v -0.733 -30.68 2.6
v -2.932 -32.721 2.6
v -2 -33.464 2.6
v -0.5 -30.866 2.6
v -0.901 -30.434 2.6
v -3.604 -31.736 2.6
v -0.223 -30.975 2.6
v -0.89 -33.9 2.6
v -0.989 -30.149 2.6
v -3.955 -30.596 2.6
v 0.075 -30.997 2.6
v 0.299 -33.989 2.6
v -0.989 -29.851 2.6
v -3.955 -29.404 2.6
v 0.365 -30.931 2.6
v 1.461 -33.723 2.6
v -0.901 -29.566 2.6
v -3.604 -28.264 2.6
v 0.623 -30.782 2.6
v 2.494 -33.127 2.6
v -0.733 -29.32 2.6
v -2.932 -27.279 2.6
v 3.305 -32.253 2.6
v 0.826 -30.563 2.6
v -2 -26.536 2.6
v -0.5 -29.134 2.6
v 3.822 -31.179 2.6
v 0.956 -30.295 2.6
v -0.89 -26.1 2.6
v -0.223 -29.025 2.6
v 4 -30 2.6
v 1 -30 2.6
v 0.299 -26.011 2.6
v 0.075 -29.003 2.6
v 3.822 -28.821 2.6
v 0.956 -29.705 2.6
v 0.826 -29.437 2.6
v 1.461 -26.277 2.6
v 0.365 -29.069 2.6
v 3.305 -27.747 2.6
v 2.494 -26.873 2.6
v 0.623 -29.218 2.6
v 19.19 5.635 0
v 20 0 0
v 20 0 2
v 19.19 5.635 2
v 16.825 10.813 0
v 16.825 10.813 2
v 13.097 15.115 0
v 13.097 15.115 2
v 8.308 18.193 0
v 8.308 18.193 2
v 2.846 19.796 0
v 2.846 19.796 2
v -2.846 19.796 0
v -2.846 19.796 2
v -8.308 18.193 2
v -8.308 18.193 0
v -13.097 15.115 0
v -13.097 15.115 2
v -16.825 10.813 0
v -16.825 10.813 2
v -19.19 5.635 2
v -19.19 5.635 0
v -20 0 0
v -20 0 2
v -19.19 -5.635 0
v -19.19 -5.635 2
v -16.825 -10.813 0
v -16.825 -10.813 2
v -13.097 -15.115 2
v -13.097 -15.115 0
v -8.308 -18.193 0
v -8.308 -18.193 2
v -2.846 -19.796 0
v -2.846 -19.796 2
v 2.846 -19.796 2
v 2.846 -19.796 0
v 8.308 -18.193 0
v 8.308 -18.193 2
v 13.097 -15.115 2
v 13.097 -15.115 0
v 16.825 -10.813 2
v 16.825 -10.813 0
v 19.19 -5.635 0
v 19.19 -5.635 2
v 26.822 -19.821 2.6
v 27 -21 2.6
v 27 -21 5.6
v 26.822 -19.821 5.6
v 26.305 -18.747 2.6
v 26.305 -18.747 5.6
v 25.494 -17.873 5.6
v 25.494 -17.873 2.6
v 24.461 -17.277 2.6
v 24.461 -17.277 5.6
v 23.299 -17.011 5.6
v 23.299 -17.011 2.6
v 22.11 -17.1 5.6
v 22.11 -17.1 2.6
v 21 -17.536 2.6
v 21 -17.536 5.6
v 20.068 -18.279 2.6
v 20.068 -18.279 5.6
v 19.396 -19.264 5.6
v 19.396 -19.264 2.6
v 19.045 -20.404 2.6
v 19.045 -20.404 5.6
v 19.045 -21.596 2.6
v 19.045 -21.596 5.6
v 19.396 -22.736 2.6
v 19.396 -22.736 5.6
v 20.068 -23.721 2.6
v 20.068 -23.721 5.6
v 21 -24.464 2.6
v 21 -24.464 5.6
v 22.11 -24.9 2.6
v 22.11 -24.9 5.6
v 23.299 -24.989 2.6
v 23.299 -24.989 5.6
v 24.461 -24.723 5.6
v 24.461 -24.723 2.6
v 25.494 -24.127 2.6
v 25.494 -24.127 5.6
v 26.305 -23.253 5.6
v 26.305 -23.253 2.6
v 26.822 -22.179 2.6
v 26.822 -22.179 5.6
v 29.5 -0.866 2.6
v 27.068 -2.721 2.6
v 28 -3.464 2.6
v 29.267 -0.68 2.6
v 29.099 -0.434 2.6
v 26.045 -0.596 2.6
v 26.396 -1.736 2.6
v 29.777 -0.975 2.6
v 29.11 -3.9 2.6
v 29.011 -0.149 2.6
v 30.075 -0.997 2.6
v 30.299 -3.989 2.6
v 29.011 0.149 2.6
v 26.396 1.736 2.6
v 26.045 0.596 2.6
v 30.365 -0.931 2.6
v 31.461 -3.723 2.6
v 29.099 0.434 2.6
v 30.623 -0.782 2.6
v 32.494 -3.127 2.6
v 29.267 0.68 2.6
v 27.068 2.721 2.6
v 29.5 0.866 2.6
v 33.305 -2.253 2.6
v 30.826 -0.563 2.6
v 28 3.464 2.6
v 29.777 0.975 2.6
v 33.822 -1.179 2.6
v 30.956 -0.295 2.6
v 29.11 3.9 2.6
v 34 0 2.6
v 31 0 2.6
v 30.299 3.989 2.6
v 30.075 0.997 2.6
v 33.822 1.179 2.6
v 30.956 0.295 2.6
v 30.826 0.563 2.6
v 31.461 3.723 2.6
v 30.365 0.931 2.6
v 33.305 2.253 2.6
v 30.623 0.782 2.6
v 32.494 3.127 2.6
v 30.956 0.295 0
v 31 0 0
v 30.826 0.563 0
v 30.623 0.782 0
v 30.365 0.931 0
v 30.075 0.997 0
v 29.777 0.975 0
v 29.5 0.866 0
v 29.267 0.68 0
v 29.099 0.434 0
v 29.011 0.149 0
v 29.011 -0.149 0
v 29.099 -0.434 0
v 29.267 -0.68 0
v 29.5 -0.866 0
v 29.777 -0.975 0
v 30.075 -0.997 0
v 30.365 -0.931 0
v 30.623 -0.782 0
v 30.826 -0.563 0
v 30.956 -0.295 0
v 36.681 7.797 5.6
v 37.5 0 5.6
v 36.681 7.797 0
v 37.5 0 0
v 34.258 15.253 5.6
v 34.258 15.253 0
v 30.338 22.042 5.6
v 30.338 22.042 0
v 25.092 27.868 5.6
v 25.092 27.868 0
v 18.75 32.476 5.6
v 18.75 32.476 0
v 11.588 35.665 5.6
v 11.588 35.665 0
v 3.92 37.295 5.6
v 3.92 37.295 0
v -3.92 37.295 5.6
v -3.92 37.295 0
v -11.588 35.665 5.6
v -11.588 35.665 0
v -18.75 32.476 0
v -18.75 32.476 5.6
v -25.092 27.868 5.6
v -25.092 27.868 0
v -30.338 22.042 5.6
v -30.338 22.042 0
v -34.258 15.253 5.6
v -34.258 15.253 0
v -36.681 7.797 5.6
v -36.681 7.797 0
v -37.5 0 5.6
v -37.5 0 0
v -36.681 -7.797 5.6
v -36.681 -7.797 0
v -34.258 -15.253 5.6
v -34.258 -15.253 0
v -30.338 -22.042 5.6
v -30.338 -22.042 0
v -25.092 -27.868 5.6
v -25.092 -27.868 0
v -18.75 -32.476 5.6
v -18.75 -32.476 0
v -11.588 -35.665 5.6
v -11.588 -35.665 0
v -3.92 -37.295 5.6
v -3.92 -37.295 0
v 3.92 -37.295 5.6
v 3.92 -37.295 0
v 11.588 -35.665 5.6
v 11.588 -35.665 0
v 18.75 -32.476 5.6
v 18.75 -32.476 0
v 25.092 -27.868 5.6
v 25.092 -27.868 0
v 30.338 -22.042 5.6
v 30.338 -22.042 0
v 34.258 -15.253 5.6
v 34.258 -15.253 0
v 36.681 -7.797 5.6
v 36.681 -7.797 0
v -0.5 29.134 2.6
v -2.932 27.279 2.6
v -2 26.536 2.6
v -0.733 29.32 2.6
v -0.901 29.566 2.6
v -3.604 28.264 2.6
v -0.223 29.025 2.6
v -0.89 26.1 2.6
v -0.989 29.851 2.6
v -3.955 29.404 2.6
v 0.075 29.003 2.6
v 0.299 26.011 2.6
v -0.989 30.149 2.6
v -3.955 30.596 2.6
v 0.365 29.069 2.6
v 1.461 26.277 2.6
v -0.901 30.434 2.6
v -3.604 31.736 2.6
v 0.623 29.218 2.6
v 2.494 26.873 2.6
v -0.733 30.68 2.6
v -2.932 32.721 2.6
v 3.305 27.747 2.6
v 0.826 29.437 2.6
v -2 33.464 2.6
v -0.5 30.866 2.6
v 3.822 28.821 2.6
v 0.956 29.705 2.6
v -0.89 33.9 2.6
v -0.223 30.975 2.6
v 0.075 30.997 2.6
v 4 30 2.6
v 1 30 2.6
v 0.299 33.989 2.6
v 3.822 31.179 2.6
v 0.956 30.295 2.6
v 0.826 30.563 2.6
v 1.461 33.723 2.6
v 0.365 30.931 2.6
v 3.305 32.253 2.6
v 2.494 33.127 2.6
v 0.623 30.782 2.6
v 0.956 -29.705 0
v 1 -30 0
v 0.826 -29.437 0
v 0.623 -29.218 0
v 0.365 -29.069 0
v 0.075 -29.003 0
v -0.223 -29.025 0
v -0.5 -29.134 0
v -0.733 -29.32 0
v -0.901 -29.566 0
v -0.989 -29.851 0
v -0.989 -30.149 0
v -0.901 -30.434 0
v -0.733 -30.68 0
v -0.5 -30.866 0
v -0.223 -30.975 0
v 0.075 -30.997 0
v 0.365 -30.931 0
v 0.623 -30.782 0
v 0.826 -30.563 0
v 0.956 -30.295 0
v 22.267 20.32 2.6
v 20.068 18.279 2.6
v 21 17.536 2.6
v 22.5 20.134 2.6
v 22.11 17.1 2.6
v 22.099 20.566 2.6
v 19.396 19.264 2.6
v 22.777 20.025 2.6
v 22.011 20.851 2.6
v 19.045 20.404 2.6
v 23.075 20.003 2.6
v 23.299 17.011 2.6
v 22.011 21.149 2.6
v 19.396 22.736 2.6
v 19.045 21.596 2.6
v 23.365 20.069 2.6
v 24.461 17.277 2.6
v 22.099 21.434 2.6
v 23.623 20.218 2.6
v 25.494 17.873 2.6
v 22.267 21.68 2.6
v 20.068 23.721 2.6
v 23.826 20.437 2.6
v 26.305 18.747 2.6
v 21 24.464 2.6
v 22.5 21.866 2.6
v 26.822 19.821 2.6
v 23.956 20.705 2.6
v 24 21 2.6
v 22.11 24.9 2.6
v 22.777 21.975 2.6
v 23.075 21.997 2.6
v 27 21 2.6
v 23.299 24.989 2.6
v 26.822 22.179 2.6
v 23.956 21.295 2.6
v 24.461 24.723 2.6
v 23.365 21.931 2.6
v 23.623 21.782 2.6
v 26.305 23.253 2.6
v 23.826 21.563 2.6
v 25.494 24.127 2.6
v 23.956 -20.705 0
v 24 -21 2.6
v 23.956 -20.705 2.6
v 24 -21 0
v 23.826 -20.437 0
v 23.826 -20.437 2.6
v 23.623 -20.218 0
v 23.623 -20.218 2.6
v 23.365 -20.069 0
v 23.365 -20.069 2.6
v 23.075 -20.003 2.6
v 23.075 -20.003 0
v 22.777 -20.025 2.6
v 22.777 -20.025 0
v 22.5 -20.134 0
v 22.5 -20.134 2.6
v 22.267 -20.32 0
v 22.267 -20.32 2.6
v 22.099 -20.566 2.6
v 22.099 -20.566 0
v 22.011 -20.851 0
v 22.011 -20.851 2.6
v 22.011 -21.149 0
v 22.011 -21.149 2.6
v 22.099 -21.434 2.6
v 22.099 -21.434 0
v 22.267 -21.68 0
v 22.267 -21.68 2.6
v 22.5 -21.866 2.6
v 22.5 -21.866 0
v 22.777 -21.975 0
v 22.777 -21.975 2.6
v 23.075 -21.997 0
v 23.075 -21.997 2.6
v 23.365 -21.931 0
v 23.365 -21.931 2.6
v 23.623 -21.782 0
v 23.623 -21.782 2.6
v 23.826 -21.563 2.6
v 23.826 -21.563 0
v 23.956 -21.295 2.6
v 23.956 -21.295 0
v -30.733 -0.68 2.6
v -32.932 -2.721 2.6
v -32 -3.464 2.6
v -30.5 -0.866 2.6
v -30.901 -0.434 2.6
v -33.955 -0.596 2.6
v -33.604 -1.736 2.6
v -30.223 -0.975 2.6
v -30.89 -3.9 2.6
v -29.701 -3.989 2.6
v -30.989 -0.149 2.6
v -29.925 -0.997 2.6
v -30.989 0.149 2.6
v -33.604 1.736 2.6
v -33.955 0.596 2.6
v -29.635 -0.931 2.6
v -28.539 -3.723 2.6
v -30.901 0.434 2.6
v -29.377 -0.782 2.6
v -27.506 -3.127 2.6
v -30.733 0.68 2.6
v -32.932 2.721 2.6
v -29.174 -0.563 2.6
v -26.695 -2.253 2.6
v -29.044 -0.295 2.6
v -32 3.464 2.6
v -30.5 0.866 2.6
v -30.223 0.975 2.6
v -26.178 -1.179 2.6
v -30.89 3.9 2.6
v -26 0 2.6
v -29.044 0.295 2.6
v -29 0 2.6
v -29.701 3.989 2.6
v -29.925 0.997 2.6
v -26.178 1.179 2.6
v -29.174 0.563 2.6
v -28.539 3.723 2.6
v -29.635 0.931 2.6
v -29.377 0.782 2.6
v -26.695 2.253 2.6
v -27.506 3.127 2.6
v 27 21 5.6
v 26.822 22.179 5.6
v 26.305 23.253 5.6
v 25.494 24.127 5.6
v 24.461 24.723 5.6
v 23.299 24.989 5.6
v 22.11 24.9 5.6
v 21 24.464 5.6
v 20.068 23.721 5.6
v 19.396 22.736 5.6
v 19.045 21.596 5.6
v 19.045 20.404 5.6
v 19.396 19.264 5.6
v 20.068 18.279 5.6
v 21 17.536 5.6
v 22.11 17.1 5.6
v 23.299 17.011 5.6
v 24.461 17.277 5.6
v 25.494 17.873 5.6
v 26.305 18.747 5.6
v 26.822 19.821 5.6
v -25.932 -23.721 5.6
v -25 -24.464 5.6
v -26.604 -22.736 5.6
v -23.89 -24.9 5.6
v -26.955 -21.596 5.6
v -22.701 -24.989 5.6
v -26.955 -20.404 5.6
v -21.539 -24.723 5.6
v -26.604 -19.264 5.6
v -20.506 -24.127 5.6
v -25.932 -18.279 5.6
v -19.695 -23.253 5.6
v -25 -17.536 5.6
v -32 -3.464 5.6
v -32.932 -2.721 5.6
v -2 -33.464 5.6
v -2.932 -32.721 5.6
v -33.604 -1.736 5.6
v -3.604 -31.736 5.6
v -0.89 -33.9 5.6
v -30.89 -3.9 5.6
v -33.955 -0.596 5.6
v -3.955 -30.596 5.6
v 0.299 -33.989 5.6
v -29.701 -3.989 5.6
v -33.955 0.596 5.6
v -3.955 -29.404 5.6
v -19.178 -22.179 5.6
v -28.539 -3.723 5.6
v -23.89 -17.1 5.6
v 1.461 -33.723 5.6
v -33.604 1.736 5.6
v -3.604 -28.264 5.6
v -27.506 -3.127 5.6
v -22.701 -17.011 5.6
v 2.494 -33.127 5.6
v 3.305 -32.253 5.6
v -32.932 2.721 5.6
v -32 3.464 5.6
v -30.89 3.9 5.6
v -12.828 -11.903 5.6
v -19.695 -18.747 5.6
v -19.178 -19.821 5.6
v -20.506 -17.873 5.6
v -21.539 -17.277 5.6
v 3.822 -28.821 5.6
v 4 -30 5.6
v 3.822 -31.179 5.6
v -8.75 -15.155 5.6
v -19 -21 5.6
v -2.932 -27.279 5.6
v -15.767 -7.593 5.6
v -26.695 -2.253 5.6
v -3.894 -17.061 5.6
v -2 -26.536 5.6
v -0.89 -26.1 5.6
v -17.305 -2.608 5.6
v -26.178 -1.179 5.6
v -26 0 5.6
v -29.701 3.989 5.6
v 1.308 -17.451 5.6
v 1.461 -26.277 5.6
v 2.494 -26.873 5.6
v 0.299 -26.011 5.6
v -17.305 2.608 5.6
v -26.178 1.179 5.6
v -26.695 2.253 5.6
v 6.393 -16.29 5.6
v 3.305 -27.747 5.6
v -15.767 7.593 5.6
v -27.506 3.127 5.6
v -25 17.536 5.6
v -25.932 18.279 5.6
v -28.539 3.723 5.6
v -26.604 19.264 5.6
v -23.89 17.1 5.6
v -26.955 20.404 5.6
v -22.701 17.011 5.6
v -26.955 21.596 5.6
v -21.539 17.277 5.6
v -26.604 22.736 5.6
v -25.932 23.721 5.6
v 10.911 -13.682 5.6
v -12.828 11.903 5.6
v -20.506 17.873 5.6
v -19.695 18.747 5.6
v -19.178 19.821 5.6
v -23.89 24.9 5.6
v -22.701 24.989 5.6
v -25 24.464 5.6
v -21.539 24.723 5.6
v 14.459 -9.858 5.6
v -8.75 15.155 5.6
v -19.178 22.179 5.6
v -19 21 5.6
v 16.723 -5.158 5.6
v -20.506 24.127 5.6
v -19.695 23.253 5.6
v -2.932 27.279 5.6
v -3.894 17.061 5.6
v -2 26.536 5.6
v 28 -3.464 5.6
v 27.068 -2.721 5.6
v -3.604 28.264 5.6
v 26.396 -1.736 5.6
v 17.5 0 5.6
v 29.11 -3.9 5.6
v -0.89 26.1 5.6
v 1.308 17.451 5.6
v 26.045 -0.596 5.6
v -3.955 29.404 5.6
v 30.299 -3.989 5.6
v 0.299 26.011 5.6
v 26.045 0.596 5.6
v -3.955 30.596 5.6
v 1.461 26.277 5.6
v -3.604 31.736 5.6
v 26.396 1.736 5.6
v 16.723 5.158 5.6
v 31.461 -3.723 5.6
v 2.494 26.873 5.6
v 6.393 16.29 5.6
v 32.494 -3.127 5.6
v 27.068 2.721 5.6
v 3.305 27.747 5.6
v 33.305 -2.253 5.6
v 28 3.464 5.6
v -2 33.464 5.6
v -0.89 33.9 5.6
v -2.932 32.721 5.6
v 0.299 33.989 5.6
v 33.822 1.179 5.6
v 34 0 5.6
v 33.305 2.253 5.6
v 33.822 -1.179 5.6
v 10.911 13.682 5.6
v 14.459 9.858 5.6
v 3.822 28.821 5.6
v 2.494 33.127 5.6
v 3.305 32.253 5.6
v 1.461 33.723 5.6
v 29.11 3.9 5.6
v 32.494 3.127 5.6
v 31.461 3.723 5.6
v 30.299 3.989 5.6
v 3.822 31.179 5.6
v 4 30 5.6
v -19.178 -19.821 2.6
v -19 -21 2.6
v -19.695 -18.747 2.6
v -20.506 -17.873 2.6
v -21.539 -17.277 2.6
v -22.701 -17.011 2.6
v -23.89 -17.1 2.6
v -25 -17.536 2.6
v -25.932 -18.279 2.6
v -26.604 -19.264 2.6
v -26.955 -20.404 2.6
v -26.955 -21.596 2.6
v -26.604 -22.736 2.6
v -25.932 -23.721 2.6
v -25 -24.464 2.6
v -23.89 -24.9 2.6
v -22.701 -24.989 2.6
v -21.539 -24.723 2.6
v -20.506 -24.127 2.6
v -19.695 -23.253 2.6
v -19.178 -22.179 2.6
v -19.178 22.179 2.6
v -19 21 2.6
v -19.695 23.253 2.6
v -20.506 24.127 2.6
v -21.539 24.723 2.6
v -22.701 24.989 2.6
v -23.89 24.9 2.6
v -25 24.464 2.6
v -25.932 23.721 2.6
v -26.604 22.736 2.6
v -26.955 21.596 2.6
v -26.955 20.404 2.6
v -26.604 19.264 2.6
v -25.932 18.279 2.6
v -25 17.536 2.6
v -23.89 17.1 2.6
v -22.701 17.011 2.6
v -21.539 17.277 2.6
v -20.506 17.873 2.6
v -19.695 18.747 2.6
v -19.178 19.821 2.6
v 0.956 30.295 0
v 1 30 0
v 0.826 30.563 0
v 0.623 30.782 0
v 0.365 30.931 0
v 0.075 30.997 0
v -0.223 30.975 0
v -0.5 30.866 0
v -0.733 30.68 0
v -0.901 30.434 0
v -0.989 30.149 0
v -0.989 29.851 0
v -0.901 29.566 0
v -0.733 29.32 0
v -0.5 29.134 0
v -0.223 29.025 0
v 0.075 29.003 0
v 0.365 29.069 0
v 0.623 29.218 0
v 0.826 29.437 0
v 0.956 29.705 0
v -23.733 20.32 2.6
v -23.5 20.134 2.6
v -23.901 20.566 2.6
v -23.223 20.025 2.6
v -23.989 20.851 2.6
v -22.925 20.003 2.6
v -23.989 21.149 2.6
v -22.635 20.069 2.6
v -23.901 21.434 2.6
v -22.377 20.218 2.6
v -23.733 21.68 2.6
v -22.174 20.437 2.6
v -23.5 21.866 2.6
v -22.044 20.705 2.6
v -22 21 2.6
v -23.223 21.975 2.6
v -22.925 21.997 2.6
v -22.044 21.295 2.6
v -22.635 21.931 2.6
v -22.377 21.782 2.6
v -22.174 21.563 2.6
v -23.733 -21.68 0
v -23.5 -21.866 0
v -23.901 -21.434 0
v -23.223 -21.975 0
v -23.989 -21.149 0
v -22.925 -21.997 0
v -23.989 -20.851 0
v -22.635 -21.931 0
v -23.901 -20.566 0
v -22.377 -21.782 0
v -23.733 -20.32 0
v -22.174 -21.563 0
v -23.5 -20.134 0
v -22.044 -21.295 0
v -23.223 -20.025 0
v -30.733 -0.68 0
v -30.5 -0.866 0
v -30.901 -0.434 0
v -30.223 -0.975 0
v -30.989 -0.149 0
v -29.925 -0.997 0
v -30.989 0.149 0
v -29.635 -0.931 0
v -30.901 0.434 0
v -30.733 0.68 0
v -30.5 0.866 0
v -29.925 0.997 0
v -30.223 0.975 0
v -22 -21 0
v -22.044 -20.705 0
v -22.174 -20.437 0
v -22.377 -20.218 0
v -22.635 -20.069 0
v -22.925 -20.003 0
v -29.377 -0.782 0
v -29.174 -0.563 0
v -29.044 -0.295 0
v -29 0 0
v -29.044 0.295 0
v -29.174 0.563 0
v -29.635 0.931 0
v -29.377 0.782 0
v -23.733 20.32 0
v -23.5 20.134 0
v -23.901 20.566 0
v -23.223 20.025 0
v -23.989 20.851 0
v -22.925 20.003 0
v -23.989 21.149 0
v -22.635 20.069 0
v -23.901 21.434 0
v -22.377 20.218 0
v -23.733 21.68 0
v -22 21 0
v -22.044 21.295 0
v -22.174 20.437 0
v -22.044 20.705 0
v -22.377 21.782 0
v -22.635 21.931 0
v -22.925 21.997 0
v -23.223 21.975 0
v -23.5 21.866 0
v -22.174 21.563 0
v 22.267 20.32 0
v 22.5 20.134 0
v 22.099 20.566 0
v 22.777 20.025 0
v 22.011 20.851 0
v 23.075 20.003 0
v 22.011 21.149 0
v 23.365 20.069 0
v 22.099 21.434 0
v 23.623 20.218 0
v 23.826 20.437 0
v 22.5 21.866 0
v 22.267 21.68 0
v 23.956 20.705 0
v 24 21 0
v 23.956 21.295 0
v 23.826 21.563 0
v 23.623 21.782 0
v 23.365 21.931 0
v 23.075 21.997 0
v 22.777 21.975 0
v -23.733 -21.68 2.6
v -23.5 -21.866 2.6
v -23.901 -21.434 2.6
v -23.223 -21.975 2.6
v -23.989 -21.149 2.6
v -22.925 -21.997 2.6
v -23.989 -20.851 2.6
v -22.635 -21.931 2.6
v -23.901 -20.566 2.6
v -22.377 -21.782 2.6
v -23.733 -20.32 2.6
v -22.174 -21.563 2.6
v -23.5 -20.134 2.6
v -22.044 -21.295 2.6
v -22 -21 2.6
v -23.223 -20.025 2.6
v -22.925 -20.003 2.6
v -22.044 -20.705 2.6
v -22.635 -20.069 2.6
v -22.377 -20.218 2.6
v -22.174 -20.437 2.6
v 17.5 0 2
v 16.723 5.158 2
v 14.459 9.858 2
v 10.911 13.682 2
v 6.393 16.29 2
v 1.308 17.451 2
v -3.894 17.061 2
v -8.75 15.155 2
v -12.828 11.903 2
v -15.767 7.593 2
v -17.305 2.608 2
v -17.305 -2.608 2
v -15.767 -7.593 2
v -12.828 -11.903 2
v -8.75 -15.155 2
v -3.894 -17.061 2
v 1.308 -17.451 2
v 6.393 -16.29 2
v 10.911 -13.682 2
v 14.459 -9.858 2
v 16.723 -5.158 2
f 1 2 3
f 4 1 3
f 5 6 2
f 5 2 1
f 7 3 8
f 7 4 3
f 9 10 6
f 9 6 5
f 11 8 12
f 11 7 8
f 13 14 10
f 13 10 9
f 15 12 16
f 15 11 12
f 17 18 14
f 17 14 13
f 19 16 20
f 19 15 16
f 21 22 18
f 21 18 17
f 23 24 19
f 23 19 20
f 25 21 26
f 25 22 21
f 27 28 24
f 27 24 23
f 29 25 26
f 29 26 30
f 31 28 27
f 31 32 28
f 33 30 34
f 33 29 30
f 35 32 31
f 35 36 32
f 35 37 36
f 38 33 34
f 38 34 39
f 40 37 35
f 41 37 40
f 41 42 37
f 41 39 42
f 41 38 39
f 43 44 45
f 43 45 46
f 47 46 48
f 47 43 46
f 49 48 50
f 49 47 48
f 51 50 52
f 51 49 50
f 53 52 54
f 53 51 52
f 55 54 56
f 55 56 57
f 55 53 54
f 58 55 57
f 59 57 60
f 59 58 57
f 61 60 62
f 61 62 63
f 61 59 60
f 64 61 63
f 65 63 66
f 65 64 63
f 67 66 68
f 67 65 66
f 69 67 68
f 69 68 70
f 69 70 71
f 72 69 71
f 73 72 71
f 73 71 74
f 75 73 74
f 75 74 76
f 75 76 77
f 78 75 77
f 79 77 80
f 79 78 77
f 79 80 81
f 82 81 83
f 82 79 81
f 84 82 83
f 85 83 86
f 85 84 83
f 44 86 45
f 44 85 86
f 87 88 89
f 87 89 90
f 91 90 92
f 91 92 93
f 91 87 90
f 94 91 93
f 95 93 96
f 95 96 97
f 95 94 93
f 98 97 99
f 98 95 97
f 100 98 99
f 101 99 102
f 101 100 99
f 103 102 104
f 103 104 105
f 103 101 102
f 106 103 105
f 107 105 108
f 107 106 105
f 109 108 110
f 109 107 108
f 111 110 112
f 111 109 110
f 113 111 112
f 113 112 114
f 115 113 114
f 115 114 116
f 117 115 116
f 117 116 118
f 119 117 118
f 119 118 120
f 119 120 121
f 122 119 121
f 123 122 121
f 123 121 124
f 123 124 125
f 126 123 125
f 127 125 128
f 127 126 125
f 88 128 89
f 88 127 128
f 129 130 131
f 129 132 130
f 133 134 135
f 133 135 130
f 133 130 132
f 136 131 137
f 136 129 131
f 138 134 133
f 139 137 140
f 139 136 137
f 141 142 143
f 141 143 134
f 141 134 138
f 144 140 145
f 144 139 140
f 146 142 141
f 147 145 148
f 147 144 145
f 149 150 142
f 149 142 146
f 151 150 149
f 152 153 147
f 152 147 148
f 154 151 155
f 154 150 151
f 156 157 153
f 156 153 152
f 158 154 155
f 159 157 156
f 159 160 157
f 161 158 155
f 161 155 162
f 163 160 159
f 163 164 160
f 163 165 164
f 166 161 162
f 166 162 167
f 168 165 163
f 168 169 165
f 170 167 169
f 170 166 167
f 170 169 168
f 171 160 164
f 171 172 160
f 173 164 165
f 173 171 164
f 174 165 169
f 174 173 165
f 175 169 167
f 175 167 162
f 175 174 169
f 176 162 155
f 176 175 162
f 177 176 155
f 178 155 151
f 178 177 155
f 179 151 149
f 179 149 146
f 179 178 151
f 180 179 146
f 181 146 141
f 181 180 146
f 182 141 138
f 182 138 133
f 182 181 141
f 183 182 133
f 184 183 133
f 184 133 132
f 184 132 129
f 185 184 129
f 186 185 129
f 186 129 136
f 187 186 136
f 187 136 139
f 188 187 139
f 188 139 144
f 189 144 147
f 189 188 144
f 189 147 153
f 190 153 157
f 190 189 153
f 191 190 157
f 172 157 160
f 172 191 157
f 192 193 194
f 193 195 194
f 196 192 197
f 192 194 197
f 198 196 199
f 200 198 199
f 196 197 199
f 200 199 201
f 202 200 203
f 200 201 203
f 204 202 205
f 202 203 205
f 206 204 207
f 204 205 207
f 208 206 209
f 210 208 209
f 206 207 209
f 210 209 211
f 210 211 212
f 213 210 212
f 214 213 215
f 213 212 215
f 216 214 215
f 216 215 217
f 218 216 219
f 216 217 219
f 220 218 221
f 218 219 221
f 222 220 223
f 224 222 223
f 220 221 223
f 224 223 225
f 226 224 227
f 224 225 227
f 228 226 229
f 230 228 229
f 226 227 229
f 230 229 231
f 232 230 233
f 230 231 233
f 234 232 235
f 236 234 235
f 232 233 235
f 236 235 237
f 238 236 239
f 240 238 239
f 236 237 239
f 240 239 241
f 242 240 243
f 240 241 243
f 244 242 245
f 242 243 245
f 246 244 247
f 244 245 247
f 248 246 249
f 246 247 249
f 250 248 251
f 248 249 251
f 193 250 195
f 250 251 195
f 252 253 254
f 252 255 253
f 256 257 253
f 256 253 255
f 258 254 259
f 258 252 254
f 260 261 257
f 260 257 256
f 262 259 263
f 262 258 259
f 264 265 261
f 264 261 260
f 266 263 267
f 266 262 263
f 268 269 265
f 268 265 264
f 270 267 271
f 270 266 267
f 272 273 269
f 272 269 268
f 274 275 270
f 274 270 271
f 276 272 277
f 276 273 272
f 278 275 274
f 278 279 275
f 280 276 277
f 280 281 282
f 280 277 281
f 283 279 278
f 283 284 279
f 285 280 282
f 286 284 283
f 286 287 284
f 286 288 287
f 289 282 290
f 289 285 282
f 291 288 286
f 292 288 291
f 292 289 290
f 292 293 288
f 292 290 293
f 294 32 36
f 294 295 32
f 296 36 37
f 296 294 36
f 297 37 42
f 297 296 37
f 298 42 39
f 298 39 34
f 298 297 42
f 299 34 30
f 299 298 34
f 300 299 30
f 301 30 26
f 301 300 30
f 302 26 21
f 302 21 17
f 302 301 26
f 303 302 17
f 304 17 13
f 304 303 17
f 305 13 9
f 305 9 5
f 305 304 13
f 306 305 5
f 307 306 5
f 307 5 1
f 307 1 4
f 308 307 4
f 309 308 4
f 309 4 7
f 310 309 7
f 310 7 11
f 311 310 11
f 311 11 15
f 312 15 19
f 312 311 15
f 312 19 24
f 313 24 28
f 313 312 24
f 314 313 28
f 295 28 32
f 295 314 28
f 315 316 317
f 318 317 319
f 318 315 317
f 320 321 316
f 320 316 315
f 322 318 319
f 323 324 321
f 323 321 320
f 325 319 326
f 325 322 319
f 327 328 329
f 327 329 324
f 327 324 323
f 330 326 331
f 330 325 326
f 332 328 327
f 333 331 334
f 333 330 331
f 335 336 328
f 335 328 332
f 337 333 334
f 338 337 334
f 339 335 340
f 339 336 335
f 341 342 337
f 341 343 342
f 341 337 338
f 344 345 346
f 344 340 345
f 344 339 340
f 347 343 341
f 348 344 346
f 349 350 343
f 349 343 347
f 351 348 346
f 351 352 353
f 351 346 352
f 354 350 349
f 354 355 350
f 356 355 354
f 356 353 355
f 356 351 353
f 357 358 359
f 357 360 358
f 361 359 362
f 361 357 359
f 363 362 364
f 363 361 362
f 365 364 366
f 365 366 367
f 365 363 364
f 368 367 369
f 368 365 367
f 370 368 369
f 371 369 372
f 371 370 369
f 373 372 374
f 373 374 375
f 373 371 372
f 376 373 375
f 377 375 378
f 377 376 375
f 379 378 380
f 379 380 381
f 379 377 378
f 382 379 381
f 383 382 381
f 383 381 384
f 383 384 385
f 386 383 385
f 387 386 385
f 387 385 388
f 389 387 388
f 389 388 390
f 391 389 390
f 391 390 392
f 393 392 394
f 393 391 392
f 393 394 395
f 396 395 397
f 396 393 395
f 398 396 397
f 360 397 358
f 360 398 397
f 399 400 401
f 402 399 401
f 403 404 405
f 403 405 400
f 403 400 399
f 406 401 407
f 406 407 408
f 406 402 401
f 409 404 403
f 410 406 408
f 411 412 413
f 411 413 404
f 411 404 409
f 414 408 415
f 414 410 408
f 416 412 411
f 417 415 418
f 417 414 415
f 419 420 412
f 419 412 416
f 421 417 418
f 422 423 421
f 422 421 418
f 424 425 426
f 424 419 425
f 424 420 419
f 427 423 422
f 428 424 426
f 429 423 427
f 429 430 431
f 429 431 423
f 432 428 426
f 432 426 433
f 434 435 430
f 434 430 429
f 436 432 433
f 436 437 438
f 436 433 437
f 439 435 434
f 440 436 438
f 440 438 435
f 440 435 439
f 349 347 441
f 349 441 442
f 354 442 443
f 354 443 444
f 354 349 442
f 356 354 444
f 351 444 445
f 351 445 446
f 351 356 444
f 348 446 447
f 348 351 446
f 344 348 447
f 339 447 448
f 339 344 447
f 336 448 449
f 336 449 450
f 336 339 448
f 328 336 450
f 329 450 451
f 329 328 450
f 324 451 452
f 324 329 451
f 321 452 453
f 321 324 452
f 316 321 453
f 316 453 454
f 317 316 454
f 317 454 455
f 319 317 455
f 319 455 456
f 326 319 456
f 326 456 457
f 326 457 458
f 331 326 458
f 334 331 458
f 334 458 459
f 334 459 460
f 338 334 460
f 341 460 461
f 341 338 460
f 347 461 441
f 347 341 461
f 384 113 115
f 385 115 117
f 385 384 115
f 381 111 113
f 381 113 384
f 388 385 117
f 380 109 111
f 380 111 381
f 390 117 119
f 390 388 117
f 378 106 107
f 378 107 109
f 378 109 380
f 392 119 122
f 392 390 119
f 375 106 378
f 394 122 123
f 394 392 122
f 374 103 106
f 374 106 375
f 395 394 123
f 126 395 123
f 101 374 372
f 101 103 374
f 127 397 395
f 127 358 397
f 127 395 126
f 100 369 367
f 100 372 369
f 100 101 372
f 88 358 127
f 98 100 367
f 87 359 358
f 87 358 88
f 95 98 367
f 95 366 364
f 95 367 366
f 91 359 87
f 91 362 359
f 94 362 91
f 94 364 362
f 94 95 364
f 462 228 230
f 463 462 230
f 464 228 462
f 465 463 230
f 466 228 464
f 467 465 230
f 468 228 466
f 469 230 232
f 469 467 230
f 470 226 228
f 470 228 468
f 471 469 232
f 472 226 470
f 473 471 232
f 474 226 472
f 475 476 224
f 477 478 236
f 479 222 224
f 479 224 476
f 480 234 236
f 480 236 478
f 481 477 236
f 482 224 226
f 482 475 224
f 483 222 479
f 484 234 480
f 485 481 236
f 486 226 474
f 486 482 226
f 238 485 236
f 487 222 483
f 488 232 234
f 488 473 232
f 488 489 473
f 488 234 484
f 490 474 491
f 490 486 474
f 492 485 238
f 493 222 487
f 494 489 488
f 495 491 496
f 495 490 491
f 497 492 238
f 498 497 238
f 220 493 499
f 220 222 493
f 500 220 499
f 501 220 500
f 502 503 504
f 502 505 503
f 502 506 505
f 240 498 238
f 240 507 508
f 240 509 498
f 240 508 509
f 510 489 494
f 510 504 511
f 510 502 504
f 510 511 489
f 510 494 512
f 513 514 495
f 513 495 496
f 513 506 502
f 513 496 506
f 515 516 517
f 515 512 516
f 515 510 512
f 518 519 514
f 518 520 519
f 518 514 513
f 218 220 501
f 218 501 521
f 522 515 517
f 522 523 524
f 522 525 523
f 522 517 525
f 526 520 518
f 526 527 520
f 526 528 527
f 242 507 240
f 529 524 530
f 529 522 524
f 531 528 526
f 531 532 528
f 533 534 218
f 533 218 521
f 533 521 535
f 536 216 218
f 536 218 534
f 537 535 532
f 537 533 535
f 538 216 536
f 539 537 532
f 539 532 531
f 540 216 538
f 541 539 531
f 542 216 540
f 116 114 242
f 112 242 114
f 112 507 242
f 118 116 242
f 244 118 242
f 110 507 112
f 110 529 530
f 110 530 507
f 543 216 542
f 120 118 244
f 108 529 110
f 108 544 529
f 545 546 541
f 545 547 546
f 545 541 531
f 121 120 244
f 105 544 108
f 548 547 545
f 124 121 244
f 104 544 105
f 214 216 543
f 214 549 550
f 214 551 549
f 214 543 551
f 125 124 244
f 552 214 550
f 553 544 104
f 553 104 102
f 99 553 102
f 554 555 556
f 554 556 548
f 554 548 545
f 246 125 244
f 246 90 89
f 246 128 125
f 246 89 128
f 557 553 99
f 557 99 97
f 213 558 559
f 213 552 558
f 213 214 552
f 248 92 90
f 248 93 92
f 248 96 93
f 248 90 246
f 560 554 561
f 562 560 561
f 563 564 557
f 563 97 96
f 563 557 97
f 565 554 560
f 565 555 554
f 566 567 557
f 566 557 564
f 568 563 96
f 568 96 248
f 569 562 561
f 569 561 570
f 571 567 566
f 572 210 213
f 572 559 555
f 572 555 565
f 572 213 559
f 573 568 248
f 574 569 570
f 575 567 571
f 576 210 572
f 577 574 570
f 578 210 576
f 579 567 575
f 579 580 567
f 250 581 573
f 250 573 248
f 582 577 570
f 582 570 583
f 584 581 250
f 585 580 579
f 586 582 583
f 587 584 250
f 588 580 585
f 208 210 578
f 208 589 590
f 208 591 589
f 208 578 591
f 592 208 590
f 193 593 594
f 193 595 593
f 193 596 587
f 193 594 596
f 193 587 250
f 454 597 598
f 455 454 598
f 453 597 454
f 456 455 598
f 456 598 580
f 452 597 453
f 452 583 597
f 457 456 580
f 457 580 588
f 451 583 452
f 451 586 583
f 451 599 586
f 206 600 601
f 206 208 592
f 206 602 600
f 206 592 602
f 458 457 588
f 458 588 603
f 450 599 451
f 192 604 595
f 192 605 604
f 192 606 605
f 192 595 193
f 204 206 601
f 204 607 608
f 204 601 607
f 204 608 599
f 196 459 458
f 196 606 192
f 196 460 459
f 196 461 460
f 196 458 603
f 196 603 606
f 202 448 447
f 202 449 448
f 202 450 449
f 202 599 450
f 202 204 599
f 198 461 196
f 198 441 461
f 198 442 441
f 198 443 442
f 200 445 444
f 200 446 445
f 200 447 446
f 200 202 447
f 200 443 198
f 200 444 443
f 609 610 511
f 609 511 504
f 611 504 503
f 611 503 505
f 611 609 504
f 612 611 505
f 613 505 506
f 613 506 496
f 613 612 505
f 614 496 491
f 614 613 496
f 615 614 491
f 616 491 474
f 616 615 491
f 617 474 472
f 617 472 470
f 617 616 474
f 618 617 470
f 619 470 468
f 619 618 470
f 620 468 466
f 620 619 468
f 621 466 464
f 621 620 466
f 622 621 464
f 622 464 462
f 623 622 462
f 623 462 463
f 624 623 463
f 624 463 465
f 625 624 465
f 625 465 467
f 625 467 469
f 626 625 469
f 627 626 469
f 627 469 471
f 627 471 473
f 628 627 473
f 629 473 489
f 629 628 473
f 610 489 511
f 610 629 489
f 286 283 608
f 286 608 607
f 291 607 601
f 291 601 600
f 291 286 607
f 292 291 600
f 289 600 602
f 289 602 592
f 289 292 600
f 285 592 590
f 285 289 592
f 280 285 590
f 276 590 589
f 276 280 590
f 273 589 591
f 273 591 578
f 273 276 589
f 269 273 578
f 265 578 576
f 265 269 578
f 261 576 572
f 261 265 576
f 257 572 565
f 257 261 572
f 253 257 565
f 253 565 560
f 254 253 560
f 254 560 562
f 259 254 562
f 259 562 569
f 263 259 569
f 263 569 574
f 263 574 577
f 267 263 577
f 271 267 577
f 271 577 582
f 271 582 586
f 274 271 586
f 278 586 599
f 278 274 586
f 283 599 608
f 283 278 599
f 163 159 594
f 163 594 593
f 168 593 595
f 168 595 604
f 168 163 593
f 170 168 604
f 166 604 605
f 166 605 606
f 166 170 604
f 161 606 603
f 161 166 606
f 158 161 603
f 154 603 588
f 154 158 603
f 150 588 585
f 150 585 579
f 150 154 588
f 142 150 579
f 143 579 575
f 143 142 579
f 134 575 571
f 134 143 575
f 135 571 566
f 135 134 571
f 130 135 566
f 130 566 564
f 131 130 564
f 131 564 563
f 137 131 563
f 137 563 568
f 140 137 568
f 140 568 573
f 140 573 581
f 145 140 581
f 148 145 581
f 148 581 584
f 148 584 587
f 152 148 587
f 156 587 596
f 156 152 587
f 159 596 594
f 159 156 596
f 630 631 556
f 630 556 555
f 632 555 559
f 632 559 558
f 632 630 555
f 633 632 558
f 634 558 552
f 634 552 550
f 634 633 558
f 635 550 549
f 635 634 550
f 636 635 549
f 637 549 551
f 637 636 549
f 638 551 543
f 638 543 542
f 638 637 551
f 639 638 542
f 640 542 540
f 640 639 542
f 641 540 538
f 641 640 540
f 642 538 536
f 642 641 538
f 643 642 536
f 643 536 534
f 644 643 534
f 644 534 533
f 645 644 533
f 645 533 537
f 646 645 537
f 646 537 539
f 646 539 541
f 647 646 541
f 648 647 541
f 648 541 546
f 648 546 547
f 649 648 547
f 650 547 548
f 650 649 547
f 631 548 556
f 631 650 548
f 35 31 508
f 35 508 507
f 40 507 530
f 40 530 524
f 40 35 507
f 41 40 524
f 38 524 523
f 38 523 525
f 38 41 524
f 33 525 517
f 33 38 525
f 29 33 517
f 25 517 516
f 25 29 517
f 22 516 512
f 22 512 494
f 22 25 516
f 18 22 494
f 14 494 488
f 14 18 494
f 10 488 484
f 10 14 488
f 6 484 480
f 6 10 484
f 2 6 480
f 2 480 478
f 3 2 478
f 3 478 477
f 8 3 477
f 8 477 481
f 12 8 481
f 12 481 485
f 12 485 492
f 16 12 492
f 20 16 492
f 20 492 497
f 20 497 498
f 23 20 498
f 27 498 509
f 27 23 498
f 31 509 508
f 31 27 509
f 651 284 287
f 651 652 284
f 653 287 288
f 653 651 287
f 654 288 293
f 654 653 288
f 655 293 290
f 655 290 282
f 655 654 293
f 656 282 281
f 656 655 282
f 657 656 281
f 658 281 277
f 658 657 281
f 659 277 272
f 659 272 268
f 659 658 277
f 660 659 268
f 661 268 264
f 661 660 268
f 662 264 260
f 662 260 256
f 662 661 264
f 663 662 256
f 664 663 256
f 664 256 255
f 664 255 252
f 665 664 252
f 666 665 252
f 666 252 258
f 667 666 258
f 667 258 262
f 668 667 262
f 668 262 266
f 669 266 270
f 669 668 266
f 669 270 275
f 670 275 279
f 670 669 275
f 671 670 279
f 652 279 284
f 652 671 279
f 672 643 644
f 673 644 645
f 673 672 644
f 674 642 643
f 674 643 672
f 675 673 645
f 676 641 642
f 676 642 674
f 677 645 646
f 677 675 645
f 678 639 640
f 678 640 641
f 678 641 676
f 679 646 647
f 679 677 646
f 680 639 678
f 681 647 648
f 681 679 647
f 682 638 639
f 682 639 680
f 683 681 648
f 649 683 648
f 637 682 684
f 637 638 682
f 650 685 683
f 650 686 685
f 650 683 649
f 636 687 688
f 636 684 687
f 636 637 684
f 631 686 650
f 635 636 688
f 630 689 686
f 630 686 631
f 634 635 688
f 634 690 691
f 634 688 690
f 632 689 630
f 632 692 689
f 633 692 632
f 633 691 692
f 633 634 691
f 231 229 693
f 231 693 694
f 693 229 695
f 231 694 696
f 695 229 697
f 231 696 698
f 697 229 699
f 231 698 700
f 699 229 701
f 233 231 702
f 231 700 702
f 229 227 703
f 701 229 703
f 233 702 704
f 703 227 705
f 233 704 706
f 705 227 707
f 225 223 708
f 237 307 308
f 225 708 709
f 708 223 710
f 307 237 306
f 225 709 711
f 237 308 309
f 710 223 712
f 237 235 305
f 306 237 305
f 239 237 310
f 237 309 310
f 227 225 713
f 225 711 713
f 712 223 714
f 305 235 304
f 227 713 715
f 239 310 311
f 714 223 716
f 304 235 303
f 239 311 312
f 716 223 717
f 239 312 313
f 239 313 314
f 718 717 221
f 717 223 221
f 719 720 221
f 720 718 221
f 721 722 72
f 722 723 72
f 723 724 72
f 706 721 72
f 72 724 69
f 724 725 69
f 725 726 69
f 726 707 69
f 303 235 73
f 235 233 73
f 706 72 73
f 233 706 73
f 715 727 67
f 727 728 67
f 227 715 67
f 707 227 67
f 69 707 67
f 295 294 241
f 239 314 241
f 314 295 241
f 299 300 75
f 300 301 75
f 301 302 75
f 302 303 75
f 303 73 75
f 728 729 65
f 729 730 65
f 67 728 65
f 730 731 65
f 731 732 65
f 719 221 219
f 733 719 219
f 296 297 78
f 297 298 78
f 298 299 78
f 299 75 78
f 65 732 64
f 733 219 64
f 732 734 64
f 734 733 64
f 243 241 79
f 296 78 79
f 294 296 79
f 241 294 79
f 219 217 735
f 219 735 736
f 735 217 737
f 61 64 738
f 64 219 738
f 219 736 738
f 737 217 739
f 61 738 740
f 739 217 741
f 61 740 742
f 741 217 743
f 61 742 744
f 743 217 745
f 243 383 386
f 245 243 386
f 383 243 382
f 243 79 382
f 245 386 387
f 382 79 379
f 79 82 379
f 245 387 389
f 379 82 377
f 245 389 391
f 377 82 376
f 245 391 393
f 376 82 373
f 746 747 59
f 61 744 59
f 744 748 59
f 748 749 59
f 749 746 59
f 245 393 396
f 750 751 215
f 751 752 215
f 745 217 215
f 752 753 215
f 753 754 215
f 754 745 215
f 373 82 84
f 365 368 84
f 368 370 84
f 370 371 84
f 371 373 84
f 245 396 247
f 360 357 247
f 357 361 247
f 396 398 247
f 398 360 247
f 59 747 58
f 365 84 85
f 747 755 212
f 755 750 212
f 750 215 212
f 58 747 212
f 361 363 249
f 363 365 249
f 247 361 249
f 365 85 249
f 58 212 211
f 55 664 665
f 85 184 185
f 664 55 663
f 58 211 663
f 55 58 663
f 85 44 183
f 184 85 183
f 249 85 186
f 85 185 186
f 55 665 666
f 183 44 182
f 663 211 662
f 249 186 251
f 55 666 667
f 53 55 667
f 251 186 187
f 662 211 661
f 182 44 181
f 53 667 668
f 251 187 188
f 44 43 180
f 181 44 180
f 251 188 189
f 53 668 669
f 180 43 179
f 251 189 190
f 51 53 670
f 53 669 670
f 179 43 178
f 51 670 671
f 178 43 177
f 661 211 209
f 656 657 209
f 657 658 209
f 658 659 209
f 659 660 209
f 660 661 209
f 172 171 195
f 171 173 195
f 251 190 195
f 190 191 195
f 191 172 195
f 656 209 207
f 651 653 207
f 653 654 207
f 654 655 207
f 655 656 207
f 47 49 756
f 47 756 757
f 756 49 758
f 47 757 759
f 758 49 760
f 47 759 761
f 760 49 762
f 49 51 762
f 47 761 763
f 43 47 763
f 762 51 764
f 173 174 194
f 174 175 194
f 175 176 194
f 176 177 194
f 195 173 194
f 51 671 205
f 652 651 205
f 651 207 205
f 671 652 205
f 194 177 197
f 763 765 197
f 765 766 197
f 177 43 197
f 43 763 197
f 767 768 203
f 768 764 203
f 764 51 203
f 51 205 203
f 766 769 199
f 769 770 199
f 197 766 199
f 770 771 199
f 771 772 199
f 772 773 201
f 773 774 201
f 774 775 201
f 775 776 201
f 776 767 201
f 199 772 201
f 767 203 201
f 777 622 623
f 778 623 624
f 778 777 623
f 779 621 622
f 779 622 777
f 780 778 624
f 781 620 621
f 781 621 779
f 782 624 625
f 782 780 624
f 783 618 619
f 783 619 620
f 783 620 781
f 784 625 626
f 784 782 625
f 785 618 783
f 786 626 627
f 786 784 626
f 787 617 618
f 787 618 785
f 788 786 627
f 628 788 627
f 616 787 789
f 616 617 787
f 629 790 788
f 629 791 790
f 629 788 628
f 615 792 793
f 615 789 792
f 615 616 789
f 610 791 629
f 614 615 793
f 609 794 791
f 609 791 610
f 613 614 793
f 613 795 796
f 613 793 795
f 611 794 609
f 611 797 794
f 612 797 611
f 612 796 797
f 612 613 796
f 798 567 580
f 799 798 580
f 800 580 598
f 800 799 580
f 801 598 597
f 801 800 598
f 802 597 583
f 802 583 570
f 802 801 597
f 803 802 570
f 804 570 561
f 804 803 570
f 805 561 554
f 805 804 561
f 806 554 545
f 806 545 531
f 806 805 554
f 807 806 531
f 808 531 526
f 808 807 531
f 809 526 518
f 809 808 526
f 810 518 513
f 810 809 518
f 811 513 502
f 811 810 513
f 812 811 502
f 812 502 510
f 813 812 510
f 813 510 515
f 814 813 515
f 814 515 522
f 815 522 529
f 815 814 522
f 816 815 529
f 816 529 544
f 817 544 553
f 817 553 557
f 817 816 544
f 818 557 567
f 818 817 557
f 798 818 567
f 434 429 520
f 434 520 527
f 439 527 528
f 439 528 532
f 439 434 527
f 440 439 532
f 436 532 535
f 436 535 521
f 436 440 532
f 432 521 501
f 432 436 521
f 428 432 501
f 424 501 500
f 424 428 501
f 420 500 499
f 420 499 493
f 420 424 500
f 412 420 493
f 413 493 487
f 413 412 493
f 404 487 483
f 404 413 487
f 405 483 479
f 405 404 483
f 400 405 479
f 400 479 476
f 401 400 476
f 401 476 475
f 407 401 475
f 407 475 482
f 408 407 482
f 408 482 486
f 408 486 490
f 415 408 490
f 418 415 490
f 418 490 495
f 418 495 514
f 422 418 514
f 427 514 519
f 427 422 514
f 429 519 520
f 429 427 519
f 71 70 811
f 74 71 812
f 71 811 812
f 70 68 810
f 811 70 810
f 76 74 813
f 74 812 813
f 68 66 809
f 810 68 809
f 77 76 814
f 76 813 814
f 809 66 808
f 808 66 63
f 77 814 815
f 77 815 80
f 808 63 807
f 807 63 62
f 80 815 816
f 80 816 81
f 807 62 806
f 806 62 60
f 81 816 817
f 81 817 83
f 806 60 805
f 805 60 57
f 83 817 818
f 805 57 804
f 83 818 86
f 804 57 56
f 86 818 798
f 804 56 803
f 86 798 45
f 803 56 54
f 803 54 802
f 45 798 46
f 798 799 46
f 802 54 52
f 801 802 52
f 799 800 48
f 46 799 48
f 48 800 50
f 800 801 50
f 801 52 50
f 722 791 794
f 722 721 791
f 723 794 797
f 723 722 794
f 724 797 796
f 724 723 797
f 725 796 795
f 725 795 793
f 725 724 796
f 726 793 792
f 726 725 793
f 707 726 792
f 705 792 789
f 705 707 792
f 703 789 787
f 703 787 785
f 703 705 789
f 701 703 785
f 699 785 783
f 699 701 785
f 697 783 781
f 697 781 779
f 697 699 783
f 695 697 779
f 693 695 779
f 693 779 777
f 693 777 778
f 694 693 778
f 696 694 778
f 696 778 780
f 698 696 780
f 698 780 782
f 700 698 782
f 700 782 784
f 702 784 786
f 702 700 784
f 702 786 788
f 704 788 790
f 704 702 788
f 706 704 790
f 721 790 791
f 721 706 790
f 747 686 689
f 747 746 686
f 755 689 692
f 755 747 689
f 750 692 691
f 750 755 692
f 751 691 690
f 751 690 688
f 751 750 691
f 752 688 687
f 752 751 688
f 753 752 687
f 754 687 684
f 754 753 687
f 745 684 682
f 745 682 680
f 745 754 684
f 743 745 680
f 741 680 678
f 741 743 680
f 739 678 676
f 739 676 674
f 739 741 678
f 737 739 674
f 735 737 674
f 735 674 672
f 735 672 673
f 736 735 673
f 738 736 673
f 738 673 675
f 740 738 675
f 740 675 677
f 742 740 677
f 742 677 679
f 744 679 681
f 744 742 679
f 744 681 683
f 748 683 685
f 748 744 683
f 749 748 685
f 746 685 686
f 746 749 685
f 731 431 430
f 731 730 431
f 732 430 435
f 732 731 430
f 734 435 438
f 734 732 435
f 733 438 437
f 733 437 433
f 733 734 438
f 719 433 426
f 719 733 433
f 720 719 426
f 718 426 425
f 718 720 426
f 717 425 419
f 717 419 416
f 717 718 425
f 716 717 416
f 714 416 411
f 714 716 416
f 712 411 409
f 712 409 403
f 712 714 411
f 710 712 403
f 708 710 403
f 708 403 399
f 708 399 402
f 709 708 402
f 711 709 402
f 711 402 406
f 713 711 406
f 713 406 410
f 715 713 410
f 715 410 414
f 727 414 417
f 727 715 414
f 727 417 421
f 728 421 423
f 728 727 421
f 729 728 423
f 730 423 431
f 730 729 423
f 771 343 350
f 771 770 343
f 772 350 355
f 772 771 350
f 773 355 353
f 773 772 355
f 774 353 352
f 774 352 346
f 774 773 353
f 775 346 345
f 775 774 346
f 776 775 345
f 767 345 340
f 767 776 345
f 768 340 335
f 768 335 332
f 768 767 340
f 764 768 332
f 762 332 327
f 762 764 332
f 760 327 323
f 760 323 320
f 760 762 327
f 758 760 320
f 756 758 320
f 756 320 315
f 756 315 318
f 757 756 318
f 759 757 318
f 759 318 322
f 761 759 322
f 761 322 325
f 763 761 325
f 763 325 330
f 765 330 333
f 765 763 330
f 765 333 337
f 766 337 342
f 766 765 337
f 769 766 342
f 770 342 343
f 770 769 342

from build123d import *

# Parameters (mm, degrees)
SKETCH_1_R      = 37.5
SKETCH_1_R_2    = 20
SKETCH_1_R_3    = 1
EXTRUDE_1_DEPTH = 2
SKETCH_2_R      = 37.5
SKETCH_2_R_2    = 17.5
SKETCH_2_R_3    = 1
EXTRUDE_2_DEPTH = 0.6
SKETCH_3_R      = 37.5
SKETCH_3_R_2    = 17.5
SKETCH_3_R_3    = 4
EXTRUDE_3_DEPTH = 3


with BuildPart() as part:
    # Эскиз1 → Бобышка-Вытянуть1 (new body)
    with BuildSketch(Plane.XY):
        Circle(SKETCH_1_R)
        Circle(SKETCH_1_R_2, mode=Mode.SUBTRACT)
        with Locations((0, 30)):
            Circle(SKETCH_1_R_3, mode=Mode.SUBTRACT)
        with Locations((0, -30)):
            Circle(SKETCH_1_R_3, mode=Mode.SUBTRACT)
        with Locations((30, 0)):
            Circle(SKETCH_1_R_3, mode=Mode.SUBTRACT)
        with Locations((-30, 0)):
            Circle(SKETCH_1_R_3, mode=Mode.SUBTRACT)
        with Locations((23, 21)):
            Circle(SKETCH_1_R_3, mode=Mode.SUBTRACT)
        with Locations((-23, 21)):
            Circle(SKETCH_1_R_3, mode=Mode.SUBTRACT)
        with Locations((-23, -21)):
            Circle(SKETCH_1_R_3, mode=Mode.SUBTRACT)
        with Locations((23, -21)):
            Circle(SKETCH_1_R_3, mode=Mode.SUBTRACT)
    extrude(amount=EXTRUDE_1_DEPTH)

    # Эскиз2 → Бобышка-Вытянуть2 (add)
    with BuildSketch(Plane.XY.offset(2)):
        Circle(SKETCH_2_R)
        Circle(SKETCH_2_R_2, mode=Mode.SUBTRACT)
        with Locations((0, 30)):
            Circle(SKETCH_2_R_3, mode=Mode.SUBTRACT)
        with Locations((0, -30)):
            Circle(SKETCH_2_R_3, mode=Mode.SUBTRACT)
        with Locations((-30, 0)):
            Circle(SKETCH_2_R_3, mode=Mode.SUBTRACT)
        with Locations((30, 0)):
            Circle(SKETCH_2_R_3, mode=Mode.SUBTRACT)
        with Locations((-23, 21)):
            Circle(SKETCH_2_R_3, mode=Mode.SUBTRACT)
        with Locations((23, 21)):
            Circle(SKETCH_2_R_3, mode=Mode.SUBTRACT)
        with Locations((23, -21)):
            Circle(SKETCH_2_R_3, mode=Mode.SUBTRACT)
        with Locations((-23, -21)):
            Circle(SKETCH_2_R_3, mode=Mode.SUBTRACT)
    extrude(amount=EXTRUDE_2_DEPTH)

    # Эскиз3 → Бобышка-Вытянуть3 (add)
    with BuildSketch(Plane.XY.offset(2.6)):
        Circle(SKETCH_3_R)
        Circle(SKETCH_3_R_2, mode=Mode.SUBTRACT)
        with Locations((0, 30)):
            Circle(SKETCH_3_R_3, mode=Mode.SUBTRACT)
        with Locations((0, -30)):
            Circle(SKETCH_3_R_3, mode=Mode.SUBTRACT)
        with Locations((30, 0)):
            Circle(SKETCH_3_R_3, mode=Mode.SUBTRACT)
        with Locations((-30, 0)):
            Circle(SKETCH_3_R_3, mode=Mode.SUBTRACT)
        with Locations((23, 21)):
            Circle(SKETCH_3_R_3, mode=Mode.SUBTRACT)
        with Locations((-23, 21)):
            Circle(SKETCH_3_R_3, mode=Mode.SUBTRACT)
        with Locations((-23, -21)):
            Circle(SKETCH_3_R_3, mode=Mode.SUBTRACT)
        with Locations((23, -21)):
            Circle(SKETCH_3_R_3, mode=Mode.SUBTRACT)
    extrude(amount=EXTRUDE_3_DEPTH)


solid = part.part
